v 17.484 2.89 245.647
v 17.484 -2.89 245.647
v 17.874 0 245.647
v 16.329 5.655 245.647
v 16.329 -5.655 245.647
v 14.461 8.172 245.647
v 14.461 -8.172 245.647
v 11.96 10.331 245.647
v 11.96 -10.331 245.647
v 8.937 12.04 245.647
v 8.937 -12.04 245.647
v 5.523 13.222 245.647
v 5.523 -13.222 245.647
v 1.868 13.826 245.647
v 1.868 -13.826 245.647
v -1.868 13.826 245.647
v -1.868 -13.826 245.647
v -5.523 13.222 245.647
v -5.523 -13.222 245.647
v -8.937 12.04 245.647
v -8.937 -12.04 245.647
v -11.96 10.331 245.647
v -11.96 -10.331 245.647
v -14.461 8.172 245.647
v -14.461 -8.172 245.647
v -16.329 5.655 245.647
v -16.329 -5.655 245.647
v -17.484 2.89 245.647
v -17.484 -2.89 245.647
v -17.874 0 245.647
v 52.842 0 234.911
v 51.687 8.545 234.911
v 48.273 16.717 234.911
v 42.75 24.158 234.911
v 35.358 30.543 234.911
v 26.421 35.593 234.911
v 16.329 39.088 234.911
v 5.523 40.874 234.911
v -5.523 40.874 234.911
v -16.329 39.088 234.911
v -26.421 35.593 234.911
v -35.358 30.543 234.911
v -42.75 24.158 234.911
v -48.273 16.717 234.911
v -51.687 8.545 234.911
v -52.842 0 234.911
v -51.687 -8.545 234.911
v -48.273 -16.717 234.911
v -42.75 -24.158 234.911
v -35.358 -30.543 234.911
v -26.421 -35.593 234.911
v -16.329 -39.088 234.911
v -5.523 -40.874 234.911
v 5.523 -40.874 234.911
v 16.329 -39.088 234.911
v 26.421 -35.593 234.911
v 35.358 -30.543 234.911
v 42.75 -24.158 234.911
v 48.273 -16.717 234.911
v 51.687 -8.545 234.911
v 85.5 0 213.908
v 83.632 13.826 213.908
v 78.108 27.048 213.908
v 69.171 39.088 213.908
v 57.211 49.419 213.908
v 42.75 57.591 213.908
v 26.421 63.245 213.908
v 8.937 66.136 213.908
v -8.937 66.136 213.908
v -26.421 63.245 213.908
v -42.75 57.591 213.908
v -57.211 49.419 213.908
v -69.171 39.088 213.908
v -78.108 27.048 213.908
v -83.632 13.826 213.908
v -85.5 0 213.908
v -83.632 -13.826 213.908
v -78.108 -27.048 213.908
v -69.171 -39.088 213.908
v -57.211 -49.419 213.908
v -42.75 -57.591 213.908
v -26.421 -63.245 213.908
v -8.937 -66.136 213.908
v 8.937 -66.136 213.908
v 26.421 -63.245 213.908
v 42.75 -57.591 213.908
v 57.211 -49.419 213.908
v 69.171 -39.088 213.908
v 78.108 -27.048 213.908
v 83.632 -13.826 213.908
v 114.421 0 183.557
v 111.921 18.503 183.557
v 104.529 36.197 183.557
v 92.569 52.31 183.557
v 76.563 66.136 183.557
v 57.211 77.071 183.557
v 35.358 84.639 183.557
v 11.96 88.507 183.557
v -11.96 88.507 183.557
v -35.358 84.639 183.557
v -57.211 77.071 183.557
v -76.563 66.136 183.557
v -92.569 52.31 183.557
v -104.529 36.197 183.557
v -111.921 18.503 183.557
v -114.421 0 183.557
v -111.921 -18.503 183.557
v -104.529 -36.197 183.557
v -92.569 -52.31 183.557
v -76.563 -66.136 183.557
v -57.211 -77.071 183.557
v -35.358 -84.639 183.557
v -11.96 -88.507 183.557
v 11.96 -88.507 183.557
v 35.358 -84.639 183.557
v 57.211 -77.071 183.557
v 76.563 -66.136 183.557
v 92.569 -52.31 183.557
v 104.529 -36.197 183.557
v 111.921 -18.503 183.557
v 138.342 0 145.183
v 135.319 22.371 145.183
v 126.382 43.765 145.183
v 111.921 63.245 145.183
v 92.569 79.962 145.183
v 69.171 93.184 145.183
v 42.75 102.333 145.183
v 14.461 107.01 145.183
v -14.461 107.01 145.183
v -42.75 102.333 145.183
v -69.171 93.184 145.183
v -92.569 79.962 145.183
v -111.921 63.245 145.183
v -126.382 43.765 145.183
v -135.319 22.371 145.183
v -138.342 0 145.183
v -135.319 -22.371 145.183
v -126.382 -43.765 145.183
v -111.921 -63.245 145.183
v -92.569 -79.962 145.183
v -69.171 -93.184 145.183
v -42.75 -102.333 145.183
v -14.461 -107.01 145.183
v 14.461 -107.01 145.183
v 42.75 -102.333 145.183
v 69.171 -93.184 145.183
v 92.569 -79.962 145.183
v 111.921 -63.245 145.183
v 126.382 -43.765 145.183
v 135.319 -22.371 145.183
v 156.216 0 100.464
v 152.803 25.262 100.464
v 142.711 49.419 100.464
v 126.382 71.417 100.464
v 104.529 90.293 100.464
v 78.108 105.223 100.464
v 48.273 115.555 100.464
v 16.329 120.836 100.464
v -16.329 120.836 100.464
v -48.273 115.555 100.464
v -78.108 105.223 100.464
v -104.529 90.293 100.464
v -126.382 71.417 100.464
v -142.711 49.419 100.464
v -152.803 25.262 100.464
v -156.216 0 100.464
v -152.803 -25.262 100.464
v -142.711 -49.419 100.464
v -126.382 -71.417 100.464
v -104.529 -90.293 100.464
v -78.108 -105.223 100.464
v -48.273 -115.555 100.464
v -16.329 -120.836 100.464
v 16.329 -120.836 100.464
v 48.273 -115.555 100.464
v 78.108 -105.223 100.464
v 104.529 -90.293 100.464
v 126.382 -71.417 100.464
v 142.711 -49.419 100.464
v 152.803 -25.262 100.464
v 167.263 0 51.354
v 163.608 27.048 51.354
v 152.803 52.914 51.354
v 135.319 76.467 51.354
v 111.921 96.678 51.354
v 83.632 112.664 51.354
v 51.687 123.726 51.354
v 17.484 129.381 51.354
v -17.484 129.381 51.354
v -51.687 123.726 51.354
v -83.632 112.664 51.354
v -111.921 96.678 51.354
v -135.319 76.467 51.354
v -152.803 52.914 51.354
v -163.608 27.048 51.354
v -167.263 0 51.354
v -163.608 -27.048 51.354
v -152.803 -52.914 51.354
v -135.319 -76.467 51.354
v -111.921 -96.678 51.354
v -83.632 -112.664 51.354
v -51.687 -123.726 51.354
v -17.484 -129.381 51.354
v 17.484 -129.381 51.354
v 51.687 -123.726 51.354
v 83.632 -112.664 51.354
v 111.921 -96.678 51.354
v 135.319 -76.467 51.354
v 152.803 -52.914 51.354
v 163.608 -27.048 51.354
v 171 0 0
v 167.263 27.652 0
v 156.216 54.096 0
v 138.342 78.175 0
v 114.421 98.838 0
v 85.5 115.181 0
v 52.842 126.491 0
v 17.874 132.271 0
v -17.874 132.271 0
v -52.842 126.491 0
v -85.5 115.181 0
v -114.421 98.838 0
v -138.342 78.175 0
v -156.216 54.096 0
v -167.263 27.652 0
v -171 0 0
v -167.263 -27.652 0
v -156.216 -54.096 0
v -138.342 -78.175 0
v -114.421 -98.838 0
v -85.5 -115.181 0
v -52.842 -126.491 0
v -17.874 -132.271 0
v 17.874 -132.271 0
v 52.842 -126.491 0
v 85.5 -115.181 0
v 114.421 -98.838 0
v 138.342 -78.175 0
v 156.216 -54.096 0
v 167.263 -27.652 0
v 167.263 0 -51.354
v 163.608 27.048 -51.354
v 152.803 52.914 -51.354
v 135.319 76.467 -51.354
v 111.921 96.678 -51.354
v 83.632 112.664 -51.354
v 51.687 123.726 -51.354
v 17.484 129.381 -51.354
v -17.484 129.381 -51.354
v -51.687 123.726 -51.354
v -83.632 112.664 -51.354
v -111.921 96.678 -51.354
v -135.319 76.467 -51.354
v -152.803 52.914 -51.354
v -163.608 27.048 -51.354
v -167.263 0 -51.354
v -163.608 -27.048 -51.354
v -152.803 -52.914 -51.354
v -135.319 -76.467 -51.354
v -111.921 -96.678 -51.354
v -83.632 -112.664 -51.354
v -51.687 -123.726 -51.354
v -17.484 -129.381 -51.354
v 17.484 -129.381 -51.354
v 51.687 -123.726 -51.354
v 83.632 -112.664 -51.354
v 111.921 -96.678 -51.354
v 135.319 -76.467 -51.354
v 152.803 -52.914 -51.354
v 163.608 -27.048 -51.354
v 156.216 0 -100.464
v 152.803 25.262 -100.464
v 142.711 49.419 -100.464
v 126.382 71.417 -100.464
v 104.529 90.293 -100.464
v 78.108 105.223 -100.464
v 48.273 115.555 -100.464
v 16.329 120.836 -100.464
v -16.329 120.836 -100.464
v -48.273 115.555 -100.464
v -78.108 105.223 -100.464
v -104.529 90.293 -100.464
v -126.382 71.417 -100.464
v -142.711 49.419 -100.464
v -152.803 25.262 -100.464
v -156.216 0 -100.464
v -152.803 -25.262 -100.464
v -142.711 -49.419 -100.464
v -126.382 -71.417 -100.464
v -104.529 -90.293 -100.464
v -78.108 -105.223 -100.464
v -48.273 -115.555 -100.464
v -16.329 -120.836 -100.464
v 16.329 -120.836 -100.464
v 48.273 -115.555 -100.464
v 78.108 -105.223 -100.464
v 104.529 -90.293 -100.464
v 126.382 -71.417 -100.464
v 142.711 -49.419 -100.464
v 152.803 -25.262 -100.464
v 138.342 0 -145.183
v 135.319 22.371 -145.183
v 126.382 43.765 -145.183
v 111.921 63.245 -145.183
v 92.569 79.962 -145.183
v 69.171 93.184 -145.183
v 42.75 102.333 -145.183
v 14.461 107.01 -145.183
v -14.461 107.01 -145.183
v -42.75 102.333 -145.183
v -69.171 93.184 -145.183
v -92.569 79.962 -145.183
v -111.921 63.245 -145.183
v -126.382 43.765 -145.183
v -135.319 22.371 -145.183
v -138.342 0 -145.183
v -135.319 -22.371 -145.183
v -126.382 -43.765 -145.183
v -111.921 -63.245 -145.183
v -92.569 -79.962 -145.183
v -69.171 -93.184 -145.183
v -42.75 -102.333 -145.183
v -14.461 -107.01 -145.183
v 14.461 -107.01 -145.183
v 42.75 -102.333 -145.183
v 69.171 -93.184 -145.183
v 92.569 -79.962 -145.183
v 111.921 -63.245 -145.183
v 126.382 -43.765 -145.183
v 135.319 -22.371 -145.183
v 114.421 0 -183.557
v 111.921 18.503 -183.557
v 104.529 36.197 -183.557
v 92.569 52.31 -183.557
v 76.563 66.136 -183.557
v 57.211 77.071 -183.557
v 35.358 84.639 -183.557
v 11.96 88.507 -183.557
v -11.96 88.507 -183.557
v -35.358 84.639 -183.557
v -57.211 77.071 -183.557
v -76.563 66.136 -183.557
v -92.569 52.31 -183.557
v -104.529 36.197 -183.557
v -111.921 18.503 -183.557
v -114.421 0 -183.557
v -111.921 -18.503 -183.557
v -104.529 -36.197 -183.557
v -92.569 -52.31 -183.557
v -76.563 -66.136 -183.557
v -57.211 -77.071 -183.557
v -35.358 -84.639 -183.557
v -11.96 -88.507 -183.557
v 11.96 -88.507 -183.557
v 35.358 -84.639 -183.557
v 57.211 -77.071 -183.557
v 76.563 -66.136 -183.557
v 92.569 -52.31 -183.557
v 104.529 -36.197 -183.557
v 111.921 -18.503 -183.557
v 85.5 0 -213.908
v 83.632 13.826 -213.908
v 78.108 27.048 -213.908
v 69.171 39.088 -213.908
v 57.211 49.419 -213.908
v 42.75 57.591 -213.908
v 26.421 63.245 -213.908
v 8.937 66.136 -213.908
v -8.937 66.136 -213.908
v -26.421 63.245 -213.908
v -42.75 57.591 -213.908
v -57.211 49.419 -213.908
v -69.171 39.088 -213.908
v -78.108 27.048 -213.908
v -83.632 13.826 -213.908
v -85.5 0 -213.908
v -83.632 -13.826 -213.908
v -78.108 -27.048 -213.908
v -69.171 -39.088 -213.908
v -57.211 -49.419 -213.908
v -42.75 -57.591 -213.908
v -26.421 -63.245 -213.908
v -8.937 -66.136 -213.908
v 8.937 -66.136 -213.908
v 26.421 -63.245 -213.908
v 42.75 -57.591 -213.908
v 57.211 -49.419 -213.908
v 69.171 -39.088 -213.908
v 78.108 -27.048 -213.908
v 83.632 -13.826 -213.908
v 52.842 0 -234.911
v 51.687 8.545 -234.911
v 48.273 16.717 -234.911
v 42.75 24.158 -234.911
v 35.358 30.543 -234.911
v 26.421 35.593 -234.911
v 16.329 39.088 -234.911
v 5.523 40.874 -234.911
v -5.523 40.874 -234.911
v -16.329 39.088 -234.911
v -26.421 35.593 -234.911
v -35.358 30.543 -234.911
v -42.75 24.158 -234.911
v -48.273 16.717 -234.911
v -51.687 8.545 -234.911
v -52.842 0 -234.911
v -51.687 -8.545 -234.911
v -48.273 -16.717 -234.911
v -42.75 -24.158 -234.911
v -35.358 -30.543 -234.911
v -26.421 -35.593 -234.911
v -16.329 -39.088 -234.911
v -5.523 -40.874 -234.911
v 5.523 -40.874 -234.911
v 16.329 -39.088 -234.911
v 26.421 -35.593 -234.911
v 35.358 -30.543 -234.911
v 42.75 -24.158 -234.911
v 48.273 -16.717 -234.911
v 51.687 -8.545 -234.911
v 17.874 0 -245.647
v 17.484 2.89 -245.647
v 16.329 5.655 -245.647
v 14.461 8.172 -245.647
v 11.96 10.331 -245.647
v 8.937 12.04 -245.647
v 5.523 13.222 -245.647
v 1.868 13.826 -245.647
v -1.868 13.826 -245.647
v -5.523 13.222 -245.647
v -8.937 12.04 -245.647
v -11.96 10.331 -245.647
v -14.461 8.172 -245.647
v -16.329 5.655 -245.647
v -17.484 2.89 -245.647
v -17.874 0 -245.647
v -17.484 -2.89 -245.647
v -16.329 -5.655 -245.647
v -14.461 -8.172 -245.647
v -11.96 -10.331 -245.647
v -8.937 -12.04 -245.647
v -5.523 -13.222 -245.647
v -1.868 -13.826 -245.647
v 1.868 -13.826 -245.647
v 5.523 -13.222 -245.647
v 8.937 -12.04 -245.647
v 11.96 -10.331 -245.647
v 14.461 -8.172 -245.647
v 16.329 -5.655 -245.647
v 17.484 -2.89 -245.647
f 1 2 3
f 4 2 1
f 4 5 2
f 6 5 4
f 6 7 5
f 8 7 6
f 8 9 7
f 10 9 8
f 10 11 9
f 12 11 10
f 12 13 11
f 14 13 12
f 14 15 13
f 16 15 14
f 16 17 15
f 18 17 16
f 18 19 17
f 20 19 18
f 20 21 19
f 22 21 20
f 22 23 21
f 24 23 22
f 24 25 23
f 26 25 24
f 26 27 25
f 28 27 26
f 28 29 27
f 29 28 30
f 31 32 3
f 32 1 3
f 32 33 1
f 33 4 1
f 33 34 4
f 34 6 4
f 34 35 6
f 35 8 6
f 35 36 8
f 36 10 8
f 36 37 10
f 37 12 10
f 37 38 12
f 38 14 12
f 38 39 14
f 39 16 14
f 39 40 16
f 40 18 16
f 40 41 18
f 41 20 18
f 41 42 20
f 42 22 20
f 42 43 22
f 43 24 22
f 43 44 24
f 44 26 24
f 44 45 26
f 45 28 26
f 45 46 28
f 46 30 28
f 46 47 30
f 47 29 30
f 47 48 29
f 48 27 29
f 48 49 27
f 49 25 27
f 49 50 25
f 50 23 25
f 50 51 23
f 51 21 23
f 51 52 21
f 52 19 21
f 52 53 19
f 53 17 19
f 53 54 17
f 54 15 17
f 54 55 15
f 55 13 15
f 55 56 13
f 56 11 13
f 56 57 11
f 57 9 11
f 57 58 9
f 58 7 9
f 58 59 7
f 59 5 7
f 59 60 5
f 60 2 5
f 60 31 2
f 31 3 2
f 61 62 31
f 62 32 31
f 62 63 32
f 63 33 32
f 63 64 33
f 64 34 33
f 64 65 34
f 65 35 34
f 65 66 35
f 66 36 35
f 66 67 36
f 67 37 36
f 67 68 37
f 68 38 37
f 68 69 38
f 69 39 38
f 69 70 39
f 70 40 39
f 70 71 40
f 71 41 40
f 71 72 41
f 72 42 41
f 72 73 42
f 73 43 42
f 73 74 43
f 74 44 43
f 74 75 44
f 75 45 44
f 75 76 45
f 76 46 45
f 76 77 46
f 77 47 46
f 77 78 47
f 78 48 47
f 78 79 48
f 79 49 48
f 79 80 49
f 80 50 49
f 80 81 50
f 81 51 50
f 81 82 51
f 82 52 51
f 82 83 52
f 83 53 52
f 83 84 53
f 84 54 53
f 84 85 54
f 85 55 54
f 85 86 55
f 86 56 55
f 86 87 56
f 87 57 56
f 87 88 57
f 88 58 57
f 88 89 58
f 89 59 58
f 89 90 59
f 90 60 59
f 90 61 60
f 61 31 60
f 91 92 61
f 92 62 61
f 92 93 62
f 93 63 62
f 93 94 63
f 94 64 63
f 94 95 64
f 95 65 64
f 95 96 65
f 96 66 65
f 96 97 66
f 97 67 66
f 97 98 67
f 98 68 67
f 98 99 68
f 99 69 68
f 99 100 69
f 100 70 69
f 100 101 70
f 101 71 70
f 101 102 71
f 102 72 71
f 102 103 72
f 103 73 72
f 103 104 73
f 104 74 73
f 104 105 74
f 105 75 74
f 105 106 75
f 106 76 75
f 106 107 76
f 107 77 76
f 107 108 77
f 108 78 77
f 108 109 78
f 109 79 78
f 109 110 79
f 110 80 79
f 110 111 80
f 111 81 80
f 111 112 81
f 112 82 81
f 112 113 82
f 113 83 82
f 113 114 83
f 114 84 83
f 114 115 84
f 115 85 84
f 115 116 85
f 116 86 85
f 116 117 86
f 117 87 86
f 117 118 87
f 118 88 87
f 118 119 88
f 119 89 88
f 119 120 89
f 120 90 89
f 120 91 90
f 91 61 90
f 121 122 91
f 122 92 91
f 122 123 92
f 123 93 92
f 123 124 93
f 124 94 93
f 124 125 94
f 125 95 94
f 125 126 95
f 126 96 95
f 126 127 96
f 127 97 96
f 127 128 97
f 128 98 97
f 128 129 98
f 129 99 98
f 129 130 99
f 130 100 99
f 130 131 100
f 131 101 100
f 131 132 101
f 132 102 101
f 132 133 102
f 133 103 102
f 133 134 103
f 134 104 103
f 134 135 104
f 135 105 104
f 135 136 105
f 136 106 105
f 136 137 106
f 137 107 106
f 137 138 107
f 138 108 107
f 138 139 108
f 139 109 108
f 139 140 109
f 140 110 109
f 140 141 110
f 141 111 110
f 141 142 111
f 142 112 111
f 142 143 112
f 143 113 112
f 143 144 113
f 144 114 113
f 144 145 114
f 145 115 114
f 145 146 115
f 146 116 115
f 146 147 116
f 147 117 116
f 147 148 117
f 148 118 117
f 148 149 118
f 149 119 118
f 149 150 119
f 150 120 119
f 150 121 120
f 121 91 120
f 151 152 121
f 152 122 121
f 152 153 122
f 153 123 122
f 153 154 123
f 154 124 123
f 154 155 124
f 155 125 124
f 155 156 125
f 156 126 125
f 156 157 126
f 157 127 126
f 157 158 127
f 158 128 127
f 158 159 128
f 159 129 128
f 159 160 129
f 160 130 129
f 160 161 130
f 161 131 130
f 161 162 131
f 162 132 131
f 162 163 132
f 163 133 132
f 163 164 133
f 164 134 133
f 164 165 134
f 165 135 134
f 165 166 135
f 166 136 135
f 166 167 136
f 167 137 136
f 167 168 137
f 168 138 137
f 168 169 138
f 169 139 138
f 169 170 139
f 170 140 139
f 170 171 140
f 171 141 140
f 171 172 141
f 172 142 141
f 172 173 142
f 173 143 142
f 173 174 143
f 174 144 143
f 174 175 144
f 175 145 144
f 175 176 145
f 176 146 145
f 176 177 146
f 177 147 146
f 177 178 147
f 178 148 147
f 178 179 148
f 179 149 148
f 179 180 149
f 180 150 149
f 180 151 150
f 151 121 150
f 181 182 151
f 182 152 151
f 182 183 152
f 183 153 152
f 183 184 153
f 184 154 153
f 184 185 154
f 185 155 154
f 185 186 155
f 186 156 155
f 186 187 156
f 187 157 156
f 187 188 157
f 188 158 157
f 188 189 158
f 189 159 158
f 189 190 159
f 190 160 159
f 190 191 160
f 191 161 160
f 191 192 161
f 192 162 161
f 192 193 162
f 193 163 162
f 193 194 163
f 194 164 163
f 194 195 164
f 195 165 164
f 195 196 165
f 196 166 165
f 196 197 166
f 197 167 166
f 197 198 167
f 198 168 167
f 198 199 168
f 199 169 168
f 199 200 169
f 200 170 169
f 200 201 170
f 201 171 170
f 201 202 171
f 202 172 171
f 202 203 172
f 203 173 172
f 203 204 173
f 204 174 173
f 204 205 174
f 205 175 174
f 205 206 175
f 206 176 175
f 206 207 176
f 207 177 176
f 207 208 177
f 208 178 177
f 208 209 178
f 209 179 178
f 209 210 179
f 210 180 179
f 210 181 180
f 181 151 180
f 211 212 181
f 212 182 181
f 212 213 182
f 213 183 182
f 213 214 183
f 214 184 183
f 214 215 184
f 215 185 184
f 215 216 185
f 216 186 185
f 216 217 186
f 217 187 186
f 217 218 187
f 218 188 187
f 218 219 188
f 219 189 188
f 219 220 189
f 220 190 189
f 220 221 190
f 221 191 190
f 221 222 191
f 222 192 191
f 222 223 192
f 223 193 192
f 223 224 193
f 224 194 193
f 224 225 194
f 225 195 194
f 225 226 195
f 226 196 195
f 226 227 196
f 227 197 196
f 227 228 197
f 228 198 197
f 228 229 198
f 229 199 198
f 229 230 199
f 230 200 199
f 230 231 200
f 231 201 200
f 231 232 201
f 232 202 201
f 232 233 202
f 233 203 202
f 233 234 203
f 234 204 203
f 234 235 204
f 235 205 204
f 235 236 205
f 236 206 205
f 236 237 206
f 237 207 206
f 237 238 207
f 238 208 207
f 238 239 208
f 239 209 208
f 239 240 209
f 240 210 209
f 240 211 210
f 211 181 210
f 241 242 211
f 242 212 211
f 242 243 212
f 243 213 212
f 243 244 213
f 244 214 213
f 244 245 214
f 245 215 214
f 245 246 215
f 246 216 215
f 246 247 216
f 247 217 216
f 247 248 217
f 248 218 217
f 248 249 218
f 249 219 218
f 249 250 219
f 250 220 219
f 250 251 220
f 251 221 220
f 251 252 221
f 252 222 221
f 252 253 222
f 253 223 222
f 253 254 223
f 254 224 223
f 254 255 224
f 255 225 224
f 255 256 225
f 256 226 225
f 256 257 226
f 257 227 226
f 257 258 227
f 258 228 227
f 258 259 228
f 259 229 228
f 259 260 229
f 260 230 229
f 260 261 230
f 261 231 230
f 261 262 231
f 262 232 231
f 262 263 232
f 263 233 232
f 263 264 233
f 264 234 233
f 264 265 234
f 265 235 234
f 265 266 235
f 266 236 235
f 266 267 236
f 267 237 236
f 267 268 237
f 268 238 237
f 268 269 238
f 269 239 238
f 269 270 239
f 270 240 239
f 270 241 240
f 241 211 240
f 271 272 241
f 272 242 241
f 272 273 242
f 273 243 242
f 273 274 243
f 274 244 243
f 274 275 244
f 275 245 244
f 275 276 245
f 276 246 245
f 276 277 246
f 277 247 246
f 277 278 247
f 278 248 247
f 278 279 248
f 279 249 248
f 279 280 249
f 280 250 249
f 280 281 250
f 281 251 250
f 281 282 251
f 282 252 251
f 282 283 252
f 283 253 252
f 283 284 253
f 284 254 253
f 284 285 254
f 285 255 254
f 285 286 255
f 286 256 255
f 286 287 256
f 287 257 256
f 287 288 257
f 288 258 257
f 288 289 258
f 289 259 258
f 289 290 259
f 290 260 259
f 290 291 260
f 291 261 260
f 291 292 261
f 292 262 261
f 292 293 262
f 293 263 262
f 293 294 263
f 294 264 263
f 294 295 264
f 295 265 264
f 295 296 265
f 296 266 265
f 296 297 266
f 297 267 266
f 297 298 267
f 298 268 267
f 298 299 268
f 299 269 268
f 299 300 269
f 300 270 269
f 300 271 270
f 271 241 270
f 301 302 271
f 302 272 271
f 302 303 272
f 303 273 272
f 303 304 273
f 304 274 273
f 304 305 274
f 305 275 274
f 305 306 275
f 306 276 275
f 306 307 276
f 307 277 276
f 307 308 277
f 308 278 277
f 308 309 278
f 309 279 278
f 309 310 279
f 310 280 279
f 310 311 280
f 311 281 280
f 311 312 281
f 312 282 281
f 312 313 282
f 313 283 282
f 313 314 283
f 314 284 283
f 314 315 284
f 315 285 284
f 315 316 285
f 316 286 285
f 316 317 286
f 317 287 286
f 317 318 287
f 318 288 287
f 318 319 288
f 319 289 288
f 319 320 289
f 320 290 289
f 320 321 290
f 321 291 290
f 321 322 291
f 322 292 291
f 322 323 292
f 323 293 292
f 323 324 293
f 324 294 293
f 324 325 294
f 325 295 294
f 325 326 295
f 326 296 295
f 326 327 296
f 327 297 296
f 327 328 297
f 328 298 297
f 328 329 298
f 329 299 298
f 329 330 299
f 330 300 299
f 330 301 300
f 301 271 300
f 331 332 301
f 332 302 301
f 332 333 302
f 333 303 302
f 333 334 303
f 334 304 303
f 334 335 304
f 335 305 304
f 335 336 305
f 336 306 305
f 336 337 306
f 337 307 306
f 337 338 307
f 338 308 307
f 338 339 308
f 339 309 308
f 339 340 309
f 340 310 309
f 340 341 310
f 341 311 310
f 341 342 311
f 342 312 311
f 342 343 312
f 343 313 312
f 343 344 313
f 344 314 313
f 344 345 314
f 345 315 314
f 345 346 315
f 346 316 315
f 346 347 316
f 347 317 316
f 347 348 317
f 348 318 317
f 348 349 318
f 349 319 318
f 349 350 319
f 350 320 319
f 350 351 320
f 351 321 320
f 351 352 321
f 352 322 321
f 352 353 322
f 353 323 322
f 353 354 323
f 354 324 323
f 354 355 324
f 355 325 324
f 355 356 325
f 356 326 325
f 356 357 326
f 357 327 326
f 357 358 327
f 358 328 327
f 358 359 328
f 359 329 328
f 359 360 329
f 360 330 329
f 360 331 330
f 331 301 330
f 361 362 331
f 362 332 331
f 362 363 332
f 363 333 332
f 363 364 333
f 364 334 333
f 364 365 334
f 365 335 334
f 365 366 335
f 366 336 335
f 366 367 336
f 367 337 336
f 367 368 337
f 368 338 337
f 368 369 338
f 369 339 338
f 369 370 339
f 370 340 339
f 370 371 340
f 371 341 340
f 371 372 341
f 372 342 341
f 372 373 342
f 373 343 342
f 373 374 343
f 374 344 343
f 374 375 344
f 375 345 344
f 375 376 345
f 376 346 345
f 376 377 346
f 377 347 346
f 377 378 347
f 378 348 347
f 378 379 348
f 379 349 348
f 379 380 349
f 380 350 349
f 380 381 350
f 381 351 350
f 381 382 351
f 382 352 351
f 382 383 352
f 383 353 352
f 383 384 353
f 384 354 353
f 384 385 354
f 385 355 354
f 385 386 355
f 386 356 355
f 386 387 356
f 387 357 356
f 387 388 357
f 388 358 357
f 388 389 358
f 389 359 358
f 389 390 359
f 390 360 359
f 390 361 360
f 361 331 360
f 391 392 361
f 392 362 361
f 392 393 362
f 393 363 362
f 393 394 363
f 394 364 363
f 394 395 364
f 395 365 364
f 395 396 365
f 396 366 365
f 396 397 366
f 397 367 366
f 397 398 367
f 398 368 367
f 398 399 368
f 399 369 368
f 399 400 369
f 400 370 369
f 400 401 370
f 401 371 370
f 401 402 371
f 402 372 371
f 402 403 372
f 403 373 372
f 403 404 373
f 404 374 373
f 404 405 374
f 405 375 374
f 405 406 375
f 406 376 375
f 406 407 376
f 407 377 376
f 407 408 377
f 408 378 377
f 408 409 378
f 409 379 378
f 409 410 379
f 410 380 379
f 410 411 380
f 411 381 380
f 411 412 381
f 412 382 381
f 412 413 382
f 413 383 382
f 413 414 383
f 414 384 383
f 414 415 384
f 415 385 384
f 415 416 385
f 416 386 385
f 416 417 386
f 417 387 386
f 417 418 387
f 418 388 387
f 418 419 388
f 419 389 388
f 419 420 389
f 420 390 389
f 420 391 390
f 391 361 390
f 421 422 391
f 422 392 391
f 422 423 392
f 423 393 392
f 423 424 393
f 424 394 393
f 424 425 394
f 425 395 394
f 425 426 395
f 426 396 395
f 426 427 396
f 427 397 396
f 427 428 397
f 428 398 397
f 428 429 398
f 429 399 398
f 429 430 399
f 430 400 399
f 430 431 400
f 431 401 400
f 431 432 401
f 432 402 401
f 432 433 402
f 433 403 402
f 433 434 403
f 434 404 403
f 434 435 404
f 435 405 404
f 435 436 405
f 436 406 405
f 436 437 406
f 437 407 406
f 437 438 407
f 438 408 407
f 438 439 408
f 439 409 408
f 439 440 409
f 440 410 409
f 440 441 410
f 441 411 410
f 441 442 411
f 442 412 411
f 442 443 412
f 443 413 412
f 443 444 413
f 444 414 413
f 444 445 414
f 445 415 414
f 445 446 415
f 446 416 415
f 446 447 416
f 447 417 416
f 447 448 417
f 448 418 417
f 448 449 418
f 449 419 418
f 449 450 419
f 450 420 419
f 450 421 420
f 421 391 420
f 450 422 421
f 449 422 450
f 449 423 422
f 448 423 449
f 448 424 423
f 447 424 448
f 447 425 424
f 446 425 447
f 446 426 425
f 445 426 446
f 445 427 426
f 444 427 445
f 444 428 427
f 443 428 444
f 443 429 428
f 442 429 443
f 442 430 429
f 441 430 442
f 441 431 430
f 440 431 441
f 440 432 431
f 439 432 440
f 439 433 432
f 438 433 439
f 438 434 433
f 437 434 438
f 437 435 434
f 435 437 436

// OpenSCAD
// Generated by SolidPython 1.0.1 on 2020-07-29 00:46:48


scale(v = [9, 7, 13]) {
	sphere(r = 19);
}
/***********************************************
*********      SolidPython code:      **********
************************************************
 
# import packages: SolidPython
from solid import *
from solid.utils import *
from itertools import chain, combinations, permutations


class Resize:

    def __init__(self, scad_file):
        self.scad_file = scad_file
        #self.scad_file = import_scad(scad_file)
        # cone/cylinder param:
        self.r1 = 0
        self.r2 = 0
        self.h = 0
        # rectangular prism param:
        self.w = 0
        self.l = 0
        # ellipse param:
        self.r = 0

    # import OpenScad code (file name corresponds to shape)


    # classify shape + parameters
    def assign(self, param1, param2, param3):
        if self.scad_file == 'cone.scad':
            self.r1 = param1
            self.r2 = param2
            self.h = param3
        elif self.scad_file == 'cylinder.scad':
            self.r1 = param1
            self.r2 = param2
            self.h = param3
        elif self.scad_file == 'rectangularPrism.scad':
            self.h = param1
            self.l = param2
            self.w = param3
        else:
            self.r = param1
            self.h = param2

    # resize parameters
    def iterate(self):
        x = range(3, 20, 2)
        i = 1
        if self.scad_file == 'cone.scad':
            tempList = list(permutations(x, 2))
            for temp in tempList:
                param1 = temp[0]
                param2 = temp[1]
                filepath = 'produced_scad_files/' + 'cone' + str(param1) + '_' + str(param2) + '_' + '.scad'
                scad_render_to_file(cylinder(h=param1, r1=param2, r2=0), filepath)

        elif self.scad_file == 'cylinder.scad':
            tempList = list(permutations(x, 3))
            for temp in tempList:
                param1 = temp[0]
                param2 = temp[1]
                filepath = 'produced_scad_files/' + 'cylinder' + str(param1) + '_' + str(param2) + '_' + '.scad'
                scad_render_to_file(cylinder(h=param1, r1=param2, r2=param2), filepath)

        elif self.scad_file == 'rectangularPrism.scad':
            tempList = list(permutations(x, 3))
            for temp in tempList:
                param1 = temp[0]
                param2 = temp[1]
                param3 = temp[2]
                filepath = 'produced_scad_files/' + 'rectangularPrism' + str(param1) + '_' + str(param2) + '_' + str(
                    param3) + '.scad'
                scad_render_to_file(cube(size=(param1, param2, param3)), filepath)

        elif self.scad_file == 'ellipse.scad':
            tempList = list(permutations(x, 4))
            for temp in tempList:
                param1 = temp[0]
                param2 = temp[1]
                param3 = temp[2]
                param4 = temp[3]
                filepath = 'produced_scad_files/' + 'ellipse' + str(param1) + '_' + str(param2) + '_' + str(param3) + '_' + str(param4) + '.scad'
                scad_render_to_file(scale([param1, param2, param3])(sphere(r=param4)), filepath)

    def render_to_scadfile(self):
        scad_render_to_file(scad, 'example.scad') 
 
************************************************/
